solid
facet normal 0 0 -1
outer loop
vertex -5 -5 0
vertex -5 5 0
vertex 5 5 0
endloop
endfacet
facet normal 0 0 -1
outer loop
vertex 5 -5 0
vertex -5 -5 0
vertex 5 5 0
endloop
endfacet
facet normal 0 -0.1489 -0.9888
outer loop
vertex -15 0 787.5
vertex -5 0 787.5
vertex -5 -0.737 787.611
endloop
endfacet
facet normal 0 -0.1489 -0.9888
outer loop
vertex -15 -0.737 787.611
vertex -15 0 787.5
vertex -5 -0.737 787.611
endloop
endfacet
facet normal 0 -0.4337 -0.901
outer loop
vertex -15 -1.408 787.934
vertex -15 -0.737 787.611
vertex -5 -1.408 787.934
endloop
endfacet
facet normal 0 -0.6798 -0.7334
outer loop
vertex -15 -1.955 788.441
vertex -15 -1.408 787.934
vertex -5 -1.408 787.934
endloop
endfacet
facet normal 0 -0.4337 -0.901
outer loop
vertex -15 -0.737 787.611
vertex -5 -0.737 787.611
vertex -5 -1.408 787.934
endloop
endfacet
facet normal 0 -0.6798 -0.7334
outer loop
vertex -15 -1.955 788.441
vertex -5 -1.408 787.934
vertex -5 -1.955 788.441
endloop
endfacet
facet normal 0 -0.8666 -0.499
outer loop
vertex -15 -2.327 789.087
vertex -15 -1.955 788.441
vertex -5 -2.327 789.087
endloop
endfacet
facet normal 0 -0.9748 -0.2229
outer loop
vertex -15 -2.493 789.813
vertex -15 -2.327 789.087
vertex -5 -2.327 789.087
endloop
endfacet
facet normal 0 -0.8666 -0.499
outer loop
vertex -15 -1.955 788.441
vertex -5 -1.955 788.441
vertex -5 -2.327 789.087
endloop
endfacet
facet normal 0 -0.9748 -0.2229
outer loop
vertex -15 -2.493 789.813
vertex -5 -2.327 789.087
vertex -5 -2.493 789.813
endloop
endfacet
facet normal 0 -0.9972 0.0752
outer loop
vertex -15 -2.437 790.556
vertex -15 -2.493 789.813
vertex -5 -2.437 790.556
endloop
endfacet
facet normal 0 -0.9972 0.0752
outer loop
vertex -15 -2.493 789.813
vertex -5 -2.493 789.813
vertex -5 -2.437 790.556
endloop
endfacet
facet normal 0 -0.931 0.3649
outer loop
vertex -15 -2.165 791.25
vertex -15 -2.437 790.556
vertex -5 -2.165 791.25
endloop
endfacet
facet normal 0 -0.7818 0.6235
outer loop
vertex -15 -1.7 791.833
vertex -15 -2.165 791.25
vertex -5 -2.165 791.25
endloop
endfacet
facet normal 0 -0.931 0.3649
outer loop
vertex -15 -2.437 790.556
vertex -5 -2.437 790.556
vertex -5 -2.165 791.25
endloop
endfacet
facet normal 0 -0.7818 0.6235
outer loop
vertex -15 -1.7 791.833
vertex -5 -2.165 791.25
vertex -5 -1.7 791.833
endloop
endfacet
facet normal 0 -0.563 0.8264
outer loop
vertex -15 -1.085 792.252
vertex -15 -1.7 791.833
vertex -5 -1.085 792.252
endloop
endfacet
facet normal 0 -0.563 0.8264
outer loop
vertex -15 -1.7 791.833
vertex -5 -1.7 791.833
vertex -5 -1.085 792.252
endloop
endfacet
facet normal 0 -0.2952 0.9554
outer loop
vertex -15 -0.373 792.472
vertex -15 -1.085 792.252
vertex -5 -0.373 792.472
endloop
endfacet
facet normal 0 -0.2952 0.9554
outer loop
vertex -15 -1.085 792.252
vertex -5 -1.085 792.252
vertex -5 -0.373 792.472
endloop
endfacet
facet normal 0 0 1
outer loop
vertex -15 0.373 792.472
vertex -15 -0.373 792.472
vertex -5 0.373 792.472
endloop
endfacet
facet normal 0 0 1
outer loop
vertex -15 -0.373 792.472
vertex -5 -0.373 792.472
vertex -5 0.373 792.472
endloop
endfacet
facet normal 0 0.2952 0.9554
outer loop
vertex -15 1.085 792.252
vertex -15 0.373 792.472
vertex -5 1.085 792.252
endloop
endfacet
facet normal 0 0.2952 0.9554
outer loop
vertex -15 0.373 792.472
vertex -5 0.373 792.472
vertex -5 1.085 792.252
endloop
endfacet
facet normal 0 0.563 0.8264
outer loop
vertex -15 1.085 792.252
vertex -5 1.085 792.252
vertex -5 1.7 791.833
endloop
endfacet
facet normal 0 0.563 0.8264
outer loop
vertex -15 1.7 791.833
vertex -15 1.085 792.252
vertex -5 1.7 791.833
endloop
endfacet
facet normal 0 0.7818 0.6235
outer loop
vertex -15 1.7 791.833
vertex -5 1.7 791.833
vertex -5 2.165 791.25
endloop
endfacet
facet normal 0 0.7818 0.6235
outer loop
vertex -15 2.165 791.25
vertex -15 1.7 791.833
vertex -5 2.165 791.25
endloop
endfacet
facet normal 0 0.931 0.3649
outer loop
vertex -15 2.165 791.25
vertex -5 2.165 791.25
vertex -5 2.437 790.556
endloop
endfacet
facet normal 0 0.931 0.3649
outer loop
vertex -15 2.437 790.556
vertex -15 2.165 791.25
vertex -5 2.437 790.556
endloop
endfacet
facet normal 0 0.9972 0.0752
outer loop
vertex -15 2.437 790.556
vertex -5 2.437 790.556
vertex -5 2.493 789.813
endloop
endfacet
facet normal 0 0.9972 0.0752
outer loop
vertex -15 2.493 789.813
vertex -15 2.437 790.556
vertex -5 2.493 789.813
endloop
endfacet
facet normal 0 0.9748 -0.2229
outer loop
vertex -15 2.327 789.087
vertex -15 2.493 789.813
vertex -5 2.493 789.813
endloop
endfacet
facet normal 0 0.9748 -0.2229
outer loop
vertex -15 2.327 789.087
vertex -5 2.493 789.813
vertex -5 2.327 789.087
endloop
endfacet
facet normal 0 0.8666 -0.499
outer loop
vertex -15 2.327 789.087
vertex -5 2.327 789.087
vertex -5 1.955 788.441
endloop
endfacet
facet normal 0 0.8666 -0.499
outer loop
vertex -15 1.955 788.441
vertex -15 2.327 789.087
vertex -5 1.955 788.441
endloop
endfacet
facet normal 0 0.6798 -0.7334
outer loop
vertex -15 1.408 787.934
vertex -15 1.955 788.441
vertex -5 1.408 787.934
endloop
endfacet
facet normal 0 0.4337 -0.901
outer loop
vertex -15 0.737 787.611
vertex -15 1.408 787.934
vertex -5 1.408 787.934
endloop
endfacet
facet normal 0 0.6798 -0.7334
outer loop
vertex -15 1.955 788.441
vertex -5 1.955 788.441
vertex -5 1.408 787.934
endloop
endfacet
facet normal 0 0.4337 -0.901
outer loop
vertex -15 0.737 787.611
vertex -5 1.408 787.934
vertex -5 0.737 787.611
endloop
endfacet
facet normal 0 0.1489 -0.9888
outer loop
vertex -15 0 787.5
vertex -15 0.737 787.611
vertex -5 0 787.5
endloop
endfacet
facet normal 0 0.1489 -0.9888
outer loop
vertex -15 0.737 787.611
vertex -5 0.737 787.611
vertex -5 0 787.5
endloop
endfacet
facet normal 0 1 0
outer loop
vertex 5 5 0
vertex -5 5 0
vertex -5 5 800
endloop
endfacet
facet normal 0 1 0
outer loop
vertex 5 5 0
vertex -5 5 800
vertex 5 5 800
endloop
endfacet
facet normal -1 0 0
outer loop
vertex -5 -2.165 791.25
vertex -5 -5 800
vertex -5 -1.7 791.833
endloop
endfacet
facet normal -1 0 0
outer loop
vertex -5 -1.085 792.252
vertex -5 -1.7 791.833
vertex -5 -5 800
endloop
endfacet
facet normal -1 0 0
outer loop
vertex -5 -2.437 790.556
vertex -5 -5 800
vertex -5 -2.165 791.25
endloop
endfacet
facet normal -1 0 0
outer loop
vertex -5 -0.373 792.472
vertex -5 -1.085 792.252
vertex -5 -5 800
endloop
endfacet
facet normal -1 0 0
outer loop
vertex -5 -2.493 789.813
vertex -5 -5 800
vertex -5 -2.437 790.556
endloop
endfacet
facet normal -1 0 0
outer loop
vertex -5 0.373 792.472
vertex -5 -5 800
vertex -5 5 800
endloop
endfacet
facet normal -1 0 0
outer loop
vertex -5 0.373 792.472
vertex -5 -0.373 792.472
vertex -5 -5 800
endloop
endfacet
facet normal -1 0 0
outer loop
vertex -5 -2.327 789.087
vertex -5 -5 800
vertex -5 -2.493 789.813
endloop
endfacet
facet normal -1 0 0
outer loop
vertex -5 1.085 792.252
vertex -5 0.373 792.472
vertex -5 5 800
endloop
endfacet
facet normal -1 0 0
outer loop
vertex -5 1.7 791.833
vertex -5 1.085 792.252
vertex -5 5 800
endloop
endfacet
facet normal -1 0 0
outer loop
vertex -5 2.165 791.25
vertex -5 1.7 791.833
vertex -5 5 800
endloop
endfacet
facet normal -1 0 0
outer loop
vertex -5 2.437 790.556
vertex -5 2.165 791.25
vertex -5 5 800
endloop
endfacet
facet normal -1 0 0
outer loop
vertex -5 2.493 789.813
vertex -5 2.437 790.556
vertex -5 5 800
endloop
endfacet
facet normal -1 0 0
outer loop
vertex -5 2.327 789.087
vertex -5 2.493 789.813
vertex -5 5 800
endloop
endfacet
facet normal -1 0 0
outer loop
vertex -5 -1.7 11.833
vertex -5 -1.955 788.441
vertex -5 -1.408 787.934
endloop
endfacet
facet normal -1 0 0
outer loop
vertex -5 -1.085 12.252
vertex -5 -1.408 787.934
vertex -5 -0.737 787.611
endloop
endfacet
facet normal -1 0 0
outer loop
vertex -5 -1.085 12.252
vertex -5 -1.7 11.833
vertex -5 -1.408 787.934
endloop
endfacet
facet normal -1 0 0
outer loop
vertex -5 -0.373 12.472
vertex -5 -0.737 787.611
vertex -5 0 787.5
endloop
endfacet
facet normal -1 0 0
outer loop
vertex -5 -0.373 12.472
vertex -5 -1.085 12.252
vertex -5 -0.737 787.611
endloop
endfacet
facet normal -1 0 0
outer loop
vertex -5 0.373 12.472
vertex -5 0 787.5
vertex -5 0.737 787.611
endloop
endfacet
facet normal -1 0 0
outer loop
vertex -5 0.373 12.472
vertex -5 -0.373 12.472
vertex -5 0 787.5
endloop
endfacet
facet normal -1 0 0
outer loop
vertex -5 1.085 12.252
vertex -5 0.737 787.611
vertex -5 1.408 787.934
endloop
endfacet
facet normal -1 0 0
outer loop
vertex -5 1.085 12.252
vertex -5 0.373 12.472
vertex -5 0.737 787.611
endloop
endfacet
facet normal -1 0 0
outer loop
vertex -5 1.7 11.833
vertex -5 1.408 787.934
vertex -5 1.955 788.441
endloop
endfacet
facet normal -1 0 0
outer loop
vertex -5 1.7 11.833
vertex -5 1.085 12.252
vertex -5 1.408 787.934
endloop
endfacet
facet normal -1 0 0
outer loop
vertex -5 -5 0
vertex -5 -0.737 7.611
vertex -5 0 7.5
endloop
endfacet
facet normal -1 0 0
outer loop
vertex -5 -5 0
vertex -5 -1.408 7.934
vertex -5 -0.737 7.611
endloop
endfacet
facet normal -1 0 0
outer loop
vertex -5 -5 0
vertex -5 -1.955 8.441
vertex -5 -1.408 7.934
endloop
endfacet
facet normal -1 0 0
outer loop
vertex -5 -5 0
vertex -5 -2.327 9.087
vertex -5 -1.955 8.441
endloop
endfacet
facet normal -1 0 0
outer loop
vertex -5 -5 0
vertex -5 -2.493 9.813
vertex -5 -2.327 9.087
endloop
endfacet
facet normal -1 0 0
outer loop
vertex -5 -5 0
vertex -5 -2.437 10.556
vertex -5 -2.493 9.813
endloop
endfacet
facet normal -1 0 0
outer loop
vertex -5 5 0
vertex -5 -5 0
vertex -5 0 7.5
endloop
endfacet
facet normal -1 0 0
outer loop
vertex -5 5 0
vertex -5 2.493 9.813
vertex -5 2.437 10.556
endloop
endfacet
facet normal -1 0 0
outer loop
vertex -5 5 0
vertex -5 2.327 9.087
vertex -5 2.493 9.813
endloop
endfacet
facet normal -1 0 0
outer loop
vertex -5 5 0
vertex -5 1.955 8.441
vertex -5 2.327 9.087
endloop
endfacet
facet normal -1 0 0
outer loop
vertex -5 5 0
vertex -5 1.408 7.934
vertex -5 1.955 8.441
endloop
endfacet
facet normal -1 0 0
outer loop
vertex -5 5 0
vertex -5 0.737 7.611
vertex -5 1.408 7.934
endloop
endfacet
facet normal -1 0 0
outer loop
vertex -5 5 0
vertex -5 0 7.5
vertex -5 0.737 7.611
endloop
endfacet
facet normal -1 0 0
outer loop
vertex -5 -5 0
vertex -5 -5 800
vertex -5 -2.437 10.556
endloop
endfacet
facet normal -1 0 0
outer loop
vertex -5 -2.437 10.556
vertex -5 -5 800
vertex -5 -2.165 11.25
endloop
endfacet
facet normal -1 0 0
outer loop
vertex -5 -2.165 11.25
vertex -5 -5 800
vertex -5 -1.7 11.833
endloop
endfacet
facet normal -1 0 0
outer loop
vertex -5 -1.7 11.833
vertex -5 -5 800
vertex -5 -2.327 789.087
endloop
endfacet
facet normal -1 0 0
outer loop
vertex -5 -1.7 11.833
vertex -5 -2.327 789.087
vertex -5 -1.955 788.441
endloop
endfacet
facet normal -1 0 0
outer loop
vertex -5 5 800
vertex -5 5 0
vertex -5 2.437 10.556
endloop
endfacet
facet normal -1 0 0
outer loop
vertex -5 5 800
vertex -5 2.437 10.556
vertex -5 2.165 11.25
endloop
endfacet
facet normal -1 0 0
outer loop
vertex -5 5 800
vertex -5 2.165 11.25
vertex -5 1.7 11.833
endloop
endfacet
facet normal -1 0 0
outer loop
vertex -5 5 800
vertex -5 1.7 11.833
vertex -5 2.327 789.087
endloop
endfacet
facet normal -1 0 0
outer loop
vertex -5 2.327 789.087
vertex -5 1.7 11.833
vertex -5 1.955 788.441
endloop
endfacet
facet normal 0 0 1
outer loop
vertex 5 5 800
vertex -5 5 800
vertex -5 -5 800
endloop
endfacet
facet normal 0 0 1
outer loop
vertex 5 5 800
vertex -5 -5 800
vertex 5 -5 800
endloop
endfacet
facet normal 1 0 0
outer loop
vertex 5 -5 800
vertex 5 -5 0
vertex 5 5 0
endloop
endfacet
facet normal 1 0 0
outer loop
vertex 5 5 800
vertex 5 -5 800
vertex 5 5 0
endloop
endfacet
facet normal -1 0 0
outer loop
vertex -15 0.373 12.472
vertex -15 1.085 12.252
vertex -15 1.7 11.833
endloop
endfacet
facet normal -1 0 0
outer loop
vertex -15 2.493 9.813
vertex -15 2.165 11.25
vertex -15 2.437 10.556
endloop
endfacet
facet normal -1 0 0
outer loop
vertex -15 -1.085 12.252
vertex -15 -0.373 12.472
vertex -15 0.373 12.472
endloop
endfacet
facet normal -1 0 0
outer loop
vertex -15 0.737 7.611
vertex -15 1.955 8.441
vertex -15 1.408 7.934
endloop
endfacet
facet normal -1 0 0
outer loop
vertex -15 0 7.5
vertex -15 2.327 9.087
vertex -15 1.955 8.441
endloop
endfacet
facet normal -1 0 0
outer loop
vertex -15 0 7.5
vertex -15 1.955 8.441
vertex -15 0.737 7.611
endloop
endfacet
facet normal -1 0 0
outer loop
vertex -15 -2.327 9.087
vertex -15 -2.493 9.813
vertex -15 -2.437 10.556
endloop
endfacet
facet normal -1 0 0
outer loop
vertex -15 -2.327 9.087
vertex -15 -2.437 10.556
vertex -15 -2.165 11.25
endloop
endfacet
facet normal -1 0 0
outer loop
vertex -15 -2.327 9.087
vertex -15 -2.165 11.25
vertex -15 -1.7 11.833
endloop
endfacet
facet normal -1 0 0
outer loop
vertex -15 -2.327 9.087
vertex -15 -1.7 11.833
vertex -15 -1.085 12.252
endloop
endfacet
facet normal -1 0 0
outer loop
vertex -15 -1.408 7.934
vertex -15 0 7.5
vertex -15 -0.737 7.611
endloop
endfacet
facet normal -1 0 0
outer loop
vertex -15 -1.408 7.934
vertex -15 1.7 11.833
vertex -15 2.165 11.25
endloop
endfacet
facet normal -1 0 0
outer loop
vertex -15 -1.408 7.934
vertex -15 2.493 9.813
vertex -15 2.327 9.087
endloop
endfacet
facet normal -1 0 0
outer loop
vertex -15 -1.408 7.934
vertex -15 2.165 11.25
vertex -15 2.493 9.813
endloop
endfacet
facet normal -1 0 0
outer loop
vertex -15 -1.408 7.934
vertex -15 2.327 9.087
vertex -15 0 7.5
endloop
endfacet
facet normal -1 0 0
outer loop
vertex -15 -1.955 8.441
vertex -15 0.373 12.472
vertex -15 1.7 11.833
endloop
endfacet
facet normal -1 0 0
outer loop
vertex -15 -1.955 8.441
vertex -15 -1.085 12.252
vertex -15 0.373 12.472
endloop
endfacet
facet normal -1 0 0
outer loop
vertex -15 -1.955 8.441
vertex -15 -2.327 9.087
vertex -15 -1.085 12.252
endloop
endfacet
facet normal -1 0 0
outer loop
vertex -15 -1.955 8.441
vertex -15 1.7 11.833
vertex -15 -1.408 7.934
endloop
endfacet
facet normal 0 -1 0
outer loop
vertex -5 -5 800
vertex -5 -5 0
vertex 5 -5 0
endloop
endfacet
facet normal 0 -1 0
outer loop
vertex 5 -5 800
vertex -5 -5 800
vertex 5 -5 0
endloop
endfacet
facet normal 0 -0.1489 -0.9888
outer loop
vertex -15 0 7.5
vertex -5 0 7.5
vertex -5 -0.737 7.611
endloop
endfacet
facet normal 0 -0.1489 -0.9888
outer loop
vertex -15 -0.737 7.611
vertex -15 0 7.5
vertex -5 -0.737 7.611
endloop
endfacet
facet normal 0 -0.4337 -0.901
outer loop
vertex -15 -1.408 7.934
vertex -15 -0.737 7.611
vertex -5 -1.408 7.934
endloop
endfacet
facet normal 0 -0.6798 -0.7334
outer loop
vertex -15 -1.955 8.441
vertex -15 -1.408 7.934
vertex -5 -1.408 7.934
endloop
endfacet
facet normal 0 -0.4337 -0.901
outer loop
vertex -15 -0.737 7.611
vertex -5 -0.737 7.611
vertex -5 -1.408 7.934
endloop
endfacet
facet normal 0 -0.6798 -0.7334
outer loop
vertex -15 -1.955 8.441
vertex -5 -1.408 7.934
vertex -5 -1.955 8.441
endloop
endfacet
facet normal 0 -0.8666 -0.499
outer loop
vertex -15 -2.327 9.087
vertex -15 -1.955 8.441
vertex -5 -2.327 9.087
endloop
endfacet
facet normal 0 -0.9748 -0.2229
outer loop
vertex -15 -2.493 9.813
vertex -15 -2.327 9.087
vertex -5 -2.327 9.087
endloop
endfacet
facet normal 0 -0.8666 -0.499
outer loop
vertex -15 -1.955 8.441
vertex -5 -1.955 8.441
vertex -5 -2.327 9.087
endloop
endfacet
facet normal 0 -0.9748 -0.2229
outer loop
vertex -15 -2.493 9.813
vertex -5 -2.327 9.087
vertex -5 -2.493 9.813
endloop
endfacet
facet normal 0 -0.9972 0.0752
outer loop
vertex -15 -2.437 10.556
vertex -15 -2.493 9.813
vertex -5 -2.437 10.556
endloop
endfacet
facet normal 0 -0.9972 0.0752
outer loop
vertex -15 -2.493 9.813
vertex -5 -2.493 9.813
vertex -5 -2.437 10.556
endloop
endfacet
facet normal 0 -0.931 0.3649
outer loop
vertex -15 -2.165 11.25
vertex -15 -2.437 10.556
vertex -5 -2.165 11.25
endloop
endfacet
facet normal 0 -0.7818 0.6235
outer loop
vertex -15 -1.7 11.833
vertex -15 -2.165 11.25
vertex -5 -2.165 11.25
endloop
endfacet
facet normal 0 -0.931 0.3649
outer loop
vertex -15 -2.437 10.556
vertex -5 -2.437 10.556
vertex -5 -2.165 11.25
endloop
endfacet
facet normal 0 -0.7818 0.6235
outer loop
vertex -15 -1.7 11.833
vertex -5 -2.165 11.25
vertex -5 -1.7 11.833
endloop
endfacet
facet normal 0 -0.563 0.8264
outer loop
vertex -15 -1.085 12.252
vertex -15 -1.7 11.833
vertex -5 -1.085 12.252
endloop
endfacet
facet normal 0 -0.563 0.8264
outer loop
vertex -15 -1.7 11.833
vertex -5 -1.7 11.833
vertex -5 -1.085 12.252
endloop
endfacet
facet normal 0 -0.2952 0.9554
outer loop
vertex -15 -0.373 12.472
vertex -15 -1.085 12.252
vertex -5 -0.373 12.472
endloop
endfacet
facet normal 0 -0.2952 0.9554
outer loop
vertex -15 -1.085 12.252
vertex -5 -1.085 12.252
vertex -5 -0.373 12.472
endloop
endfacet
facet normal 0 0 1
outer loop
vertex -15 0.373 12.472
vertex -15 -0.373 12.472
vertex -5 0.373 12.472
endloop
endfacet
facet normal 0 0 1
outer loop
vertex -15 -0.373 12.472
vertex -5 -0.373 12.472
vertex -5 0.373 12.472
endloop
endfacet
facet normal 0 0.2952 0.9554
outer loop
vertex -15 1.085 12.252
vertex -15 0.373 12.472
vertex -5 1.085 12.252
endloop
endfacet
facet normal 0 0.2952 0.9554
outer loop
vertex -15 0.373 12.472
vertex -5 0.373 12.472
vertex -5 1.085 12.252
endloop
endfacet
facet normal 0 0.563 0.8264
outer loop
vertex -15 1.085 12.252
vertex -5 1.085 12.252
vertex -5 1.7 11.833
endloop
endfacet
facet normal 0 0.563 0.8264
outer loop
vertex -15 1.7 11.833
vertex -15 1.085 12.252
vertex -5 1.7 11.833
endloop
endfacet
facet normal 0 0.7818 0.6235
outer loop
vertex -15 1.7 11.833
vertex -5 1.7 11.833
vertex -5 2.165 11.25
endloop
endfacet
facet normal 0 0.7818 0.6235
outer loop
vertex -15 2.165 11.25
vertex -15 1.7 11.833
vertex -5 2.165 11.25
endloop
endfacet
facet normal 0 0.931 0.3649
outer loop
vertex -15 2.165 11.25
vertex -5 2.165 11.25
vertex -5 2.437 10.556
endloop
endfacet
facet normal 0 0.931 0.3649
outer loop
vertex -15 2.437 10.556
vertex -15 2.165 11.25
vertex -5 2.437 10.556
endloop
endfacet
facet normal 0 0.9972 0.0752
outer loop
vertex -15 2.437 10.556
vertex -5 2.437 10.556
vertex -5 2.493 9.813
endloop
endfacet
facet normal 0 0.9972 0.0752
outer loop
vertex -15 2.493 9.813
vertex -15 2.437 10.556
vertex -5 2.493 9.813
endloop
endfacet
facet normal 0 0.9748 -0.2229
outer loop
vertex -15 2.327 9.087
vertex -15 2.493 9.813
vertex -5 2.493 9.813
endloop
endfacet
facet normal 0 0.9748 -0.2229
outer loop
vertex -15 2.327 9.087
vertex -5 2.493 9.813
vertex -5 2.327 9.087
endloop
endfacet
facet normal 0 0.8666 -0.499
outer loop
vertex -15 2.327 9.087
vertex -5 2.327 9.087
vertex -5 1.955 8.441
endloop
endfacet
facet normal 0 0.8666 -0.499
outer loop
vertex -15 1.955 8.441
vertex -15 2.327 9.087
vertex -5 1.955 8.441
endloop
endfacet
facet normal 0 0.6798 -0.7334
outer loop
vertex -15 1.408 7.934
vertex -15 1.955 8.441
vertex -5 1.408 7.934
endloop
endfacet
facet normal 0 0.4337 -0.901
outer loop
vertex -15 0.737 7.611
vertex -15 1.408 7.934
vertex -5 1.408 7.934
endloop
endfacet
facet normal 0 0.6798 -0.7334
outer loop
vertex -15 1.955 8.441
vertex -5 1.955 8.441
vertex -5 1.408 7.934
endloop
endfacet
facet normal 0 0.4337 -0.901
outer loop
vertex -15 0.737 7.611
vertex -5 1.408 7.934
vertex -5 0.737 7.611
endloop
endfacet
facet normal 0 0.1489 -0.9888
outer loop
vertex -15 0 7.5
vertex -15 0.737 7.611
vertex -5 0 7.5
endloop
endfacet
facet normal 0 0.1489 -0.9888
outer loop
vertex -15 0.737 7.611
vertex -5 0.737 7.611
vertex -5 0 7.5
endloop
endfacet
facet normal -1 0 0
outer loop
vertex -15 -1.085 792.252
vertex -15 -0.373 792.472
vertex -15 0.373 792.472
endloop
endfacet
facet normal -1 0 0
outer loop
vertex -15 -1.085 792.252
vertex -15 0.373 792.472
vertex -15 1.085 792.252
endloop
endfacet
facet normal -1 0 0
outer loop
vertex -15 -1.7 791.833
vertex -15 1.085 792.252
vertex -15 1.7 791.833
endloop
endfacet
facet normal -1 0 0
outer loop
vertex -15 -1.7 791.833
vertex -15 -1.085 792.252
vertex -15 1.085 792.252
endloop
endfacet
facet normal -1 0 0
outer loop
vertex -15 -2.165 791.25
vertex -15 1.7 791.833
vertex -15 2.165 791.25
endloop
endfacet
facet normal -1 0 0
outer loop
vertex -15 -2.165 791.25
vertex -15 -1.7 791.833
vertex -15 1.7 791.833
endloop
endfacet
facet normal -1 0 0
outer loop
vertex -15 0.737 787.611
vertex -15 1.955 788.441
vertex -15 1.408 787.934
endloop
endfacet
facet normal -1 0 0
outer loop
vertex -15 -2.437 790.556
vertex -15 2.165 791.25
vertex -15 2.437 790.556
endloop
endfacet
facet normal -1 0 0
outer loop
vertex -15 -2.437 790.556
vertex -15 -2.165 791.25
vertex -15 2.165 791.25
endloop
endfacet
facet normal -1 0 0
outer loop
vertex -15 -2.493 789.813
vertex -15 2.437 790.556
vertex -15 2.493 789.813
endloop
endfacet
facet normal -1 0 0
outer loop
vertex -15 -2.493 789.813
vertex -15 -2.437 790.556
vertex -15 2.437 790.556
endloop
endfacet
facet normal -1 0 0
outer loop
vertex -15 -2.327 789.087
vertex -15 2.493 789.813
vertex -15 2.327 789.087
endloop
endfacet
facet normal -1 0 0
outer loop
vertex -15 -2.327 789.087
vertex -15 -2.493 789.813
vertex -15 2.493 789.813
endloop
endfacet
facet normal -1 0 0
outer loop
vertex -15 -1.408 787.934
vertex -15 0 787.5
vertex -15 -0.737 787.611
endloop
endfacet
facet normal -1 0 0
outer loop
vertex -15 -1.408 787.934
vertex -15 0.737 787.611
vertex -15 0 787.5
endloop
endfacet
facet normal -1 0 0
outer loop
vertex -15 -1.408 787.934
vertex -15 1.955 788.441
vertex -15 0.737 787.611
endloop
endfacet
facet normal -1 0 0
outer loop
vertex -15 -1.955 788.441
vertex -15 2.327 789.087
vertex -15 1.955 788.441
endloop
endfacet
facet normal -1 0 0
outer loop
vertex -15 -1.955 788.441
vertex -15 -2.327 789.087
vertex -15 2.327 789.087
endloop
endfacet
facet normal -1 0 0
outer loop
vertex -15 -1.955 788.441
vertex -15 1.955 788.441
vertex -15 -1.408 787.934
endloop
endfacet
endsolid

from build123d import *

# Parameters (mm, degrees)
SKETCH1_W           = 10
SKETCH1_H           = 10
BOSS_EXTRUDE1_DEPTH = 800
SKETCH4_R           = 2.5
BOSS_EXTRUDE3_DEPTH = 10


with BuildPart() as part:
    # Sketch1 → Boss-Extrude1 (new body)
    with BuildSketch(Plane.XY):
        Rectangle(SKETCH1_W, SKETCH1_H)
    extrude(amount=BOSS_EXTRUDE1_DEPTH)

    # Sketch4 → Boss-Extrude3 (add)
    with BuildSketch(Plane.ZY.offset(5)):
        with Locations(Location((10, 0, 0), (0, 0, 180))):
            Circle(SKETCH4_R)
        with Locations(Location((790, 0, 0), (0, 0, 180))):
            Circle(SKETCH4_R)
    extrude(amount=BOSS_EXTRUDE3_DEPTH)


solid = part.part
